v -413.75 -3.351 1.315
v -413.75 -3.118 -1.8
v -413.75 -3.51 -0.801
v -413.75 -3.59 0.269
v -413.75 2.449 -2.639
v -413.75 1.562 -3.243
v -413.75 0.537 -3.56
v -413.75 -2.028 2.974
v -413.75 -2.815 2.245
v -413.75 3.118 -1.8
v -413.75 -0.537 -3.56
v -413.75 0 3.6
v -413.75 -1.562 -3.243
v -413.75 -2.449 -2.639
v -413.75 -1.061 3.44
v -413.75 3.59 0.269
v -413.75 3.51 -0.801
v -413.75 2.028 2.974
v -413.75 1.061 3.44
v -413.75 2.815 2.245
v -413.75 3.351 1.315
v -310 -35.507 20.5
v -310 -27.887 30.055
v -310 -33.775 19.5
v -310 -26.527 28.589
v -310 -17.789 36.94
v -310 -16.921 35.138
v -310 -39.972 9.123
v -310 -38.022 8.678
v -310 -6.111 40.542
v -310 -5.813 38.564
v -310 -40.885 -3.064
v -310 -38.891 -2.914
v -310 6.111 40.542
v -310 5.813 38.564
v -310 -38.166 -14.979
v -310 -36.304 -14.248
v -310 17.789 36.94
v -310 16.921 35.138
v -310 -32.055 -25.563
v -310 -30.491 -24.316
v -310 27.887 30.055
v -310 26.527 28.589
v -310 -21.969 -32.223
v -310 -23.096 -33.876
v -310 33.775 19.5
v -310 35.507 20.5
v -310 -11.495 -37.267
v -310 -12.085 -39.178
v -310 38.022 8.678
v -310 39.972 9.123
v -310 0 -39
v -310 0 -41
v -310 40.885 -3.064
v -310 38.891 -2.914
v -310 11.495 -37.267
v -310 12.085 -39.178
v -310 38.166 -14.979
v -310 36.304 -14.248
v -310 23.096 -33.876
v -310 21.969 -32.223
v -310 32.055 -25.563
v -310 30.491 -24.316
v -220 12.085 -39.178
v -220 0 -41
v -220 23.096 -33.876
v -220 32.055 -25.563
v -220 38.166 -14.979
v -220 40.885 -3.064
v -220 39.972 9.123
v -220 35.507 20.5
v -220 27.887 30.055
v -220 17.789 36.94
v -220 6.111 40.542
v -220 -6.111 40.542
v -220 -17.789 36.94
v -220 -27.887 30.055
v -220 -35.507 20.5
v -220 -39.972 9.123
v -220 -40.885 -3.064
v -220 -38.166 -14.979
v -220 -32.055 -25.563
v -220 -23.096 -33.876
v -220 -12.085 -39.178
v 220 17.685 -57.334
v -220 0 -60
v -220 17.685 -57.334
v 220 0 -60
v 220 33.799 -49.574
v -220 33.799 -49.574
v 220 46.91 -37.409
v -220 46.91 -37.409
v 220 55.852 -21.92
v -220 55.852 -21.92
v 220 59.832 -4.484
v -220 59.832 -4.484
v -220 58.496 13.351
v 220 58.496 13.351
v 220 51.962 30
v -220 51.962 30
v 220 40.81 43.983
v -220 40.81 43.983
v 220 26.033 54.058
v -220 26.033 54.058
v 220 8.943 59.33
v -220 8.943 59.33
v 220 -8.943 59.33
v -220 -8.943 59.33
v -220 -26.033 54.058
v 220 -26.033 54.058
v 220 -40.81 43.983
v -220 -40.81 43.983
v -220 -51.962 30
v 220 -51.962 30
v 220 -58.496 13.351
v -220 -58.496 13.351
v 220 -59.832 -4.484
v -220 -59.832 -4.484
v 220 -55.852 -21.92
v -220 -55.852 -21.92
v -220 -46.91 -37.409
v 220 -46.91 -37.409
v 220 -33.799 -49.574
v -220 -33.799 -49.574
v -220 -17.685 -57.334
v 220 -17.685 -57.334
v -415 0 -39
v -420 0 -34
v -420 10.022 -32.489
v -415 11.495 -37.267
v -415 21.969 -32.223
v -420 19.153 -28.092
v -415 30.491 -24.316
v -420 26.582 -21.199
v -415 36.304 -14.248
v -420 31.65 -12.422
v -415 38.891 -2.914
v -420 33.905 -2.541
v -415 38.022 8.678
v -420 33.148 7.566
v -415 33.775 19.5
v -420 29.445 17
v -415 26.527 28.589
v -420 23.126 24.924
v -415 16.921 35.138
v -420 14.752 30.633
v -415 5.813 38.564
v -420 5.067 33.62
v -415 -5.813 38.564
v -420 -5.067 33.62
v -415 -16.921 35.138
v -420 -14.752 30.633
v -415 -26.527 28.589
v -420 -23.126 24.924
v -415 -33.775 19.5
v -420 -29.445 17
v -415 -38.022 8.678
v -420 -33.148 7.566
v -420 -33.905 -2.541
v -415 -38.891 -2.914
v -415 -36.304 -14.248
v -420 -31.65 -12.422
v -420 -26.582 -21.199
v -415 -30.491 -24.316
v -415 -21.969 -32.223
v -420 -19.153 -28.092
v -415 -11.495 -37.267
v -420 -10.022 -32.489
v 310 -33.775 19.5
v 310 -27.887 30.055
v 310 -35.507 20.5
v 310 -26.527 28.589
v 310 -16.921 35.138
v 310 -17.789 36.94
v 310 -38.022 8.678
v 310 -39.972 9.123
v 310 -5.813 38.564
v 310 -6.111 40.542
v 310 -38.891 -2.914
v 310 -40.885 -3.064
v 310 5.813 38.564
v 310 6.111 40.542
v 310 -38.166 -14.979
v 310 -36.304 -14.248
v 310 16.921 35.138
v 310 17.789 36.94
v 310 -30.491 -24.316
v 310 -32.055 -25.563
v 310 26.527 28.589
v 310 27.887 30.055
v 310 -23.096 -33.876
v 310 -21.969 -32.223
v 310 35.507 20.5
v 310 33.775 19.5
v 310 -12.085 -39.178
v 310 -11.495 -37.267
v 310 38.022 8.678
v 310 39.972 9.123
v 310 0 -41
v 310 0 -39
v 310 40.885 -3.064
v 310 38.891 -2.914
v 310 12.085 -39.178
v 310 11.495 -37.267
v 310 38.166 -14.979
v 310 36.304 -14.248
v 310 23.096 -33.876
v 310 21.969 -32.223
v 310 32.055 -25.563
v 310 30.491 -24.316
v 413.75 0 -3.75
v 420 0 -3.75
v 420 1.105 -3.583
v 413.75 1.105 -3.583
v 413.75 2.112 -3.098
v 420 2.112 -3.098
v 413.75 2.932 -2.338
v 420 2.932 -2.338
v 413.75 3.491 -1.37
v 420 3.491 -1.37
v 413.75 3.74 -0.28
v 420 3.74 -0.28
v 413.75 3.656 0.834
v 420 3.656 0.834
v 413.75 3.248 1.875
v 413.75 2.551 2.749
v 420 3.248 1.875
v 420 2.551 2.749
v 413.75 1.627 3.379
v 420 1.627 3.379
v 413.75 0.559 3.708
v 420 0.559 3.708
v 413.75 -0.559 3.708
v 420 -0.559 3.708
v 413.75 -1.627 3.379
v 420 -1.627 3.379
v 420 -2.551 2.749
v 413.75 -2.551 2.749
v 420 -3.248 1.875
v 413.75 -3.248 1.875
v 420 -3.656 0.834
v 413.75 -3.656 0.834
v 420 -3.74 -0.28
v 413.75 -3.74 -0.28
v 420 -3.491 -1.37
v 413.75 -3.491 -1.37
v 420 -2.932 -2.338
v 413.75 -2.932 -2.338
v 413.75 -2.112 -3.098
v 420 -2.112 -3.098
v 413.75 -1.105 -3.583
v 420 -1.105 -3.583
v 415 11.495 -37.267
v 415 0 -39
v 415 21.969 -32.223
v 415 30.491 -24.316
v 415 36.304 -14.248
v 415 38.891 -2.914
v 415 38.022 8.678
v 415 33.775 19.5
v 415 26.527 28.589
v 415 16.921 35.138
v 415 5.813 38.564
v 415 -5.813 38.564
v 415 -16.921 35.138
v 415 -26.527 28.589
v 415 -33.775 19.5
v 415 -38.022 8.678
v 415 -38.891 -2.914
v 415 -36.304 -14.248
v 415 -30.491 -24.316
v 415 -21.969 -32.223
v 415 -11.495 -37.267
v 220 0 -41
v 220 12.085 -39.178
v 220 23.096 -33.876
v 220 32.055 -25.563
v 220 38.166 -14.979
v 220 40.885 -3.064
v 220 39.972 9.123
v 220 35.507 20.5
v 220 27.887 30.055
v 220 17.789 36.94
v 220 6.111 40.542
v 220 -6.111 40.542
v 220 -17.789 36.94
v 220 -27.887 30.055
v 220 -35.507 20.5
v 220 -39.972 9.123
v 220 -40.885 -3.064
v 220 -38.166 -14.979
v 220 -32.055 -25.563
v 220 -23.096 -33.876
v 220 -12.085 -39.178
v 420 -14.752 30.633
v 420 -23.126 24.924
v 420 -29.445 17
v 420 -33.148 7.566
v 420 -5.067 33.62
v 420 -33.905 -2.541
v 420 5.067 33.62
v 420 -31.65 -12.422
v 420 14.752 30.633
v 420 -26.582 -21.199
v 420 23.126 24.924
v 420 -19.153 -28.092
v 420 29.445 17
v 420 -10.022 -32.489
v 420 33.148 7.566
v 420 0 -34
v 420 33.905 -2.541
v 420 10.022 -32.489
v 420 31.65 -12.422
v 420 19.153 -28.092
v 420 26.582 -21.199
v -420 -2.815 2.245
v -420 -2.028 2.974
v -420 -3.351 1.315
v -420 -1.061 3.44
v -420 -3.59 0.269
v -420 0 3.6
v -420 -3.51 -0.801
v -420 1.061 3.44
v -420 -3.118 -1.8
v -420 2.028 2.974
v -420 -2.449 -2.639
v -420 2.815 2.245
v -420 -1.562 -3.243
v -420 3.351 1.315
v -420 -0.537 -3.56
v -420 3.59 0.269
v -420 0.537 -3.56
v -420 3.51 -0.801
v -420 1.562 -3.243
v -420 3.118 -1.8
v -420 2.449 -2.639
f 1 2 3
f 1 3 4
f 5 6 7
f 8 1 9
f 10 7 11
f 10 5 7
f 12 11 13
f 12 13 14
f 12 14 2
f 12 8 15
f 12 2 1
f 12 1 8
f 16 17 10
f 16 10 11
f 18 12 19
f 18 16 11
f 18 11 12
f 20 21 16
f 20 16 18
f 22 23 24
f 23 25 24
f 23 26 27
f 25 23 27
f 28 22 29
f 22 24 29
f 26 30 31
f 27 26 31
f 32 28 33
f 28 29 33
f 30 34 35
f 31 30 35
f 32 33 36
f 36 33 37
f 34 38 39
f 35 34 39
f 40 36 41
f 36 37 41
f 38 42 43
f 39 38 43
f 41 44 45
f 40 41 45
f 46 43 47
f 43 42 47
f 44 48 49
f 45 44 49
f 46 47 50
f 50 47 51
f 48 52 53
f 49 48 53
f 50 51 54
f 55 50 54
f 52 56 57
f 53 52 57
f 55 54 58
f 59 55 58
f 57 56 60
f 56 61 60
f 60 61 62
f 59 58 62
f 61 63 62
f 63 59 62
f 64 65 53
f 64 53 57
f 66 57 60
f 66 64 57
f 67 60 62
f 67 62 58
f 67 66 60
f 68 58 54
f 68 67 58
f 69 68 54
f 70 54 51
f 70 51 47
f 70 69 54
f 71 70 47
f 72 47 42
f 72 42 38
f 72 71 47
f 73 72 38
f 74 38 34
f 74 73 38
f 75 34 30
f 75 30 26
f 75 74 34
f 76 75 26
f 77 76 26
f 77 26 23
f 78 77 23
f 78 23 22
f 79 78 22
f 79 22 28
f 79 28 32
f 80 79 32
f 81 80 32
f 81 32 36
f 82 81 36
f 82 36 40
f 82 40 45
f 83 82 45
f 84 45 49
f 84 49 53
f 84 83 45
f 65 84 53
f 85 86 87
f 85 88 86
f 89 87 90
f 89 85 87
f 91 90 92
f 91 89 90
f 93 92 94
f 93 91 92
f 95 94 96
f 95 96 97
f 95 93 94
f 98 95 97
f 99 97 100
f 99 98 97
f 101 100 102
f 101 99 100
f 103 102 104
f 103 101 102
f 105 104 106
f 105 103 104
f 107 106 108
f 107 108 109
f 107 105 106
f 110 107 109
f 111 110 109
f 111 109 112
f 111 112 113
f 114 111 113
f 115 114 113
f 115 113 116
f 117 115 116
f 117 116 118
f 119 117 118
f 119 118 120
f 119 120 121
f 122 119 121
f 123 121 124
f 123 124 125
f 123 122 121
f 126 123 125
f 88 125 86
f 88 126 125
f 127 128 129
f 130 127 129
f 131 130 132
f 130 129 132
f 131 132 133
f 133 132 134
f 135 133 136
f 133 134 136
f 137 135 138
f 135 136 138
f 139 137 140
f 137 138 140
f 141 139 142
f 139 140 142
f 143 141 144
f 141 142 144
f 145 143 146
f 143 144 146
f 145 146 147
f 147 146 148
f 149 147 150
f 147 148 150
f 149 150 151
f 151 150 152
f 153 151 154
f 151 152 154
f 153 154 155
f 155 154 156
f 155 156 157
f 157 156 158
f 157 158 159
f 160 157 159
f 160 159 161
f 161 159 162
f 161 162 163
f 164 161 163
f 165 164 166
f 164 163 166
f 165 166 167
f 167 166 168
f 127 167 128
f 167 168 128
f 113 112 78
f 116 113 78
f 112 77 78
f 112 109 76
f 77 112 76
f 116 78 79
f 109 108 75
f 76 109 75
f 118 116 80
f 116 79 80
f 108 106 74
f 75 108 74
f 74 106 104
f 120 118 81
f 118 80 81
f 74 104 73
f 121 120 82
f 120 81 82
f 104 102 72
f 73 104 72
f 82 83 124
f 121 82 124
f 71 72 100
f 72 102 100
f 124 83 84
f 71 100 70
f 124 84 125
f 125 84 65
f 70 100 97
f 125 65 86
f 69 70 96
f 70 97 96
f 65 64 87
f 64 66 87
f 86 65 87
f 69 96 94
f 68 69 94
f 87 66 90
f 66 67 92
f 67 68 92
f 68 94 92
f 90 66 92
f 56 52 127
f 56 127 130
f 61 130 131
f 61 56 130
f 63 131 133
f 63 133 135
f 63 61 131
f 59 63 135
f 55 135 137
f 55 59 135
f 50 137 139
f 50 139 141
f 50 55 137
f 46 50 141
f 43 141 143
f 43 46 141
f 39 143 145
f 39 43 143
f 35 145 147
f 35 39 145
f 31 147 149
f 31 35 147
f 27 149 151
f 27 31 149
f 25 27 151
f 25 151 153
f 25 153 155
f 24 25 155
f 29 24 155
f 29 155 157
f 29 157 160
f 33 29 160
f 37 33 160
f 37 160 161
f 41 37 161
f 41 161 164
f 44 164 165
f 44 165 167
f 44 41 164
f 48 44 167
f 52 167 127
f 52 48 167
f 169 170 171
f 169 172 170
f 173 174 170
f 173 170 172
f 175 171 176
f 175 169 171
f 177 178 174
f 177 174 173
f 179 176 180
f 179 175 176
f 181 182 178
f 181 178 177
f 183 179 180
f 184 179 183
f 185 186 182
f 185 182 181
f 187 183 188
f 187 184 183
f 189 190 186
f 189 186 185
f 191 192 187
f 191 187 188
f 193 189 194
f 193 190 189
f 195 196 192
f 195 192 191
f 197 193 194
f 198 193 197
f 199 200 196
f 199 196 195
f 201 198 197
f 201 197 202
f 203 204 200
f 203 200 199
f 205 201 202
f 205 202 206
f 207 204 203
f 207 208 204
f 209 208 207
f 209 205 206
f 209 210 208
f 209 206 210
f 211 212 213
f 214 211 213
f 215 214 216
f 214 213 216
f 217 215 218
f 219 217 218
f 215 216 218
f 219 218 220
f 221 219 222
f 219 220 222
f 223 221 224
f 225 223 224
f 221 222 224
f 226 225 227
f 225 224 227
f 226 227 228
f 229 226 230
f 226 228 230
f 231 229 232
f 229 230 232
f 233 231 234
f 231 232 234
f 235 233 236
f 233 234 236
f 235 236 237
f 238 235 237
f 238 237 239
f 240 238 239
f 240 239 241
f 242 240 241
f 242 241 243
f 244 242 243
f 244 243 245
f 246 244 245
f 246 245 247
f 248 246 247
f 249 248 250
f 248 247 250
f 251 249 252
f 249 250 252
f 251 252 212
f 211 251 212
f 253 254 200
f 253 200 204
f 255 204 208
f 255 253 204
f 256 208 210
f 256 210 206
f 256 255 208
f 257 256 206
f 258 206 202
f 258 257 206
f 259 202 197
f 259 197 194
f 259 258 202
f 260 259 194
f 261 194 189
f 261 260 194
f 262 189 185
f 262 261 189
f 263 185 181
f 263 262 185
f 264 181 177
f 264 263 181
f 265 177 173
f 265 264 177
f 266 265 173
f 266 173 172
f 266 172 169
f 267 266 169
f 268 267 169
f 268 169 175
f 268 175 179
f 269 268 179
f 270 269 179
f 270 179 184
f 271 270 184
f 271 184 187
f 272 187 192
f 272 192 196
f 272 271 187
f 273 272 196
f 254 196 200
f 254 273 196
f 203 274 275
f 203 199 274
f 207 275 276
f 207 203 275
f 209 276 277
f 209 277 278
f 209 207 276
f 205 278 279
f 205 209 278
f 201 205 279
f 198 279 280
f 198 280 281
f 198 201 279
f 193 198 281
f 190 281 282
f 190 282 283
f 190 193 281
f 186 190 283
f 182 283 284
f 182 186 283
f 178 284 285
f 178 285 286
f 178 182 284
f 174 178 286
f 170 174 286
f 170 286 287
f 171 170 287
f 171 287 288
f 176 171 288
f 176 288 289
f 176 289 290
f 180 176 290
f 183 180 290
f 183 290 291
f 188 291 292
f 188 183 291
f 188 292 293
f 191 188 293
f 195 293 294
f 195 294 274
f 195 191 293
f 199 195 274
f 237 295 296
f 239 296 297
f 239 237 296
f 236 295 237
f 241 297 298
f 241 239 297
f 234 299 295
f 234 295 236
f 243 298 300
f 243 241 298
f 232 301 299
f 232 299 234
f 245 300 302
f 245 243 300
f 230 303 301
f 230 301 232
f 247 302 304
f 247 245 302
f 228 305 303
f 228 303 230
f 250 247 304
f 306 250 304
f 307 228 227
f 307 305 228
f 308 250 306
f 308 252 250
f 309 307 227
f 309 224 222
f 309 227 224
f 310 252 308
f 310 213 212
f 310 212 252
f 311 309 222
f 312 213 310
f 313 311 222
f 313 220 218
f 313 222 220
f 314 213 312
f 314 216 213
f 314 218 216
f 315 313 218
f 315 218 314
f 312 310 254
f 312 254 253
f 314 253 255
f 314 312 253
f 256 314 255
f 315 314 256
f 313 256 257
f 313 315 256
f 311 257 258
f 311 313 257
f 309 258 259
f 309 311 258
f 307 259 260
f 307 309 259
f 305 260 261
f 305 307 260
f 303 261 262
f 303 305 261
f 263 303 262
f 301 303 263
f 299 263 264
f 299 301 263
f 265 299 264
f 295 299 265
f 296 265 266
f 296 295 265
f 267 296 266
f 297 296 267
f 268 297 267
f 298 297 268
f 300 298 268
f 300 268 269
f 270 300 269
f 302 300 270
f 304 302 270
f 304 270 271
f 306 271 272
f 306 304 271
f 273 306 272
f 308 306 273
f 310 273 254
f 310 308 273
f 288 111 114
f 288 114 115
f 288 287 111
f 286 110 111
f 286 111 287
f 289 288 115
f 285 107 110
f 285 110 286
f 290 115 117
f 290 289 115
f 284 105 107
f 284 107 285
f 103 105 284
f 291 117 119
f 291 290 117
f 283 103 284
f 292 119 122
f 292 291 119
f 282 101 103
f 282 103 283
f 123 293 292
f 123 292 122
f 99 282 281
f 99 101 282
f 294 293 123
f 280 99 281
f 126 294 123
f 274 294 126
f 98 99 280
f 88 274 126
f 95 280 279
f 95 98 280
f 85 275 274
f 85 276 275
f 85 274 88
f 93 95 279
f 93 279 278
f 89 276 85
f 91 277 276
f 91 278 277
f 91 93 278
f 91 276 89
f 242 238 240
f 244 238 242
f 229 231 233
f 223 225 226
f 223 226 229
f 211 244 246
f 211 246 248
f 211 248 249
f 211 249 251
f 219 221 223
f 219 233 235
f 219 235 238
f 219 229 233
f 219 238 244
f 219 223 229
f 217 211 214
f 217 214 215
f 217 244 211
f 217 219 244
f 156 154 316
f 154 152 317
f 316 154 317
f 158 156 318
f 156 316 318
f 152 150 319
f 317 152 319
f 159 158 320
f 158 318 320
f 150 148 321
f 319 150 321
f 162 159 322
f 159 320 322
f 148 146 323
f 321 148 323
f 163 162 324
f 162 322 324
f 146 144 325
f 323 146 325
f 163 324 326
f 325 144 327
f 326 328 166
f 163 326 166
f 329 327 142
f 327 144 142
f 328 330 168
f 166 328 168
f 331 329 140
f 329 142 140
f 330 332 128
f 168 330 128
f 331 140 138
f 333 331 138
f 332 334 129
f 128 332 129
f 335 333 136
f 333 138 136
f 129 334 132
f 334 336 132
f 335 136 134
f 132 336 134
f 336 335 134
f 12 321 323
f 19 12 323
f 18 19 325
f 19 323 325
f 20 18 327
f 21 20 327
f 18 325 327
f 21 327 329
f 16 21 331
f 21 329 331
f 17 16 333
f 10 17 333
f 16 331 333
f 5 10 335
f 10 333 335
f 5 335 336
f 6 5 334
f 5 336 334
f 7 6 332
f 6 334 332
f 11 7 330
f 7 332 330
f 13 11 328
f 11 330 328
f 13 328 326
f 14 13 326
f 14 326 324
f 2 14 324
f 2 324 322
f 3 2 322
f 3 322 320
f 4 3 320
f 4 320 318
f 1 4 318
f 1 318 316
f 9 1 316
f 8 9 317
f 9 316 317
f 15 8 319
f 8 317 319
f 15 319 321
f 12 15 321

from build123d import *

# Parameters (mm, degrees)
SKETCH1_R           = 60
BOSS_EXTRUDE1_DEPTH = 220
SKETCH2_R           = 41
BOSS_EXTRUDE2_DEPTH = 310
SKETCH3_R           = 39
BOSS_EXTRUDE3_DEPTH = 420
SKETCH4_R           = 3.75
CUT_EXTRUDE1_DEPTH  = 6.25
SKETCH5_R           = 3.6
CUT_EXTRUDE2_DEPTH  = 6.25
CHAMFER1_SIZE       = 5


with BuildPart() as part:
    # Sketch1 → Boss-Extrude1 (new body, symmetric)
    with BuildSketch(Plane(origin=(0, 0, 0), x_dir=(0, 0, -1), z_dir=(1, 0, 0))):
        Circle(SKETCH1_R)
    extrude(amount=BOSS_EXTRUDE1_DEPTH, both=True)

    # Sketch2 → Boss-Extrude2 (add, symmetric)
    with BuildSketch(Plane(origin=(0, 0, 0), x_dir=(0, 0, -1), z_dir=(1, 0, 0))):
        Circle(SKETCH2_R)
    extrude(amount=BOSS_EXTRUDE2_DEPTH, both=True)

    # Sketch3 → Boss-Extrude3 (add, symmetric)
    with BuildSketch(Plane(origin=(0, 0, 0), x_dir=(0, 0, -1), z_dir=(1, 0, 0))):
        Circle(SKETCH3_R)
    extrude(amount=BOSS_EXTRUDE3_DEPTH, both=True)

    # Sketch4 → Cut-Extrude1 (cut)
    with BuildSketch(Plane(origin=(420, 0, 0), x_dir=(0, 0, -1), z_dir=(1, 0, 0))):
        Circle(SKETCH4_R)
    extrude(amount=-CUT_EXTRUDE1_DEPTH, mode=Mode.SUBTRACT)

    # Sketch5 → Cut-Extrude2 (cut)
    with BuildSketch(Plane.ZY.offset(420)):
        Circle(SKETCH5_R)
    extrude(amount=-CUT_EXTRUDE2_DEPTH, mode=Mode.SUBTRACT)

    # Chamfer1
    chamfer1_edges = [part.edges().sort_by_distance(p)[0] for p in [
        (-420, 0, 39),
        (420, 0, 39),
    ]]
    chamfer(chamfer1_edges, length=CHAMFER1_SIZE)


solid = part.part
